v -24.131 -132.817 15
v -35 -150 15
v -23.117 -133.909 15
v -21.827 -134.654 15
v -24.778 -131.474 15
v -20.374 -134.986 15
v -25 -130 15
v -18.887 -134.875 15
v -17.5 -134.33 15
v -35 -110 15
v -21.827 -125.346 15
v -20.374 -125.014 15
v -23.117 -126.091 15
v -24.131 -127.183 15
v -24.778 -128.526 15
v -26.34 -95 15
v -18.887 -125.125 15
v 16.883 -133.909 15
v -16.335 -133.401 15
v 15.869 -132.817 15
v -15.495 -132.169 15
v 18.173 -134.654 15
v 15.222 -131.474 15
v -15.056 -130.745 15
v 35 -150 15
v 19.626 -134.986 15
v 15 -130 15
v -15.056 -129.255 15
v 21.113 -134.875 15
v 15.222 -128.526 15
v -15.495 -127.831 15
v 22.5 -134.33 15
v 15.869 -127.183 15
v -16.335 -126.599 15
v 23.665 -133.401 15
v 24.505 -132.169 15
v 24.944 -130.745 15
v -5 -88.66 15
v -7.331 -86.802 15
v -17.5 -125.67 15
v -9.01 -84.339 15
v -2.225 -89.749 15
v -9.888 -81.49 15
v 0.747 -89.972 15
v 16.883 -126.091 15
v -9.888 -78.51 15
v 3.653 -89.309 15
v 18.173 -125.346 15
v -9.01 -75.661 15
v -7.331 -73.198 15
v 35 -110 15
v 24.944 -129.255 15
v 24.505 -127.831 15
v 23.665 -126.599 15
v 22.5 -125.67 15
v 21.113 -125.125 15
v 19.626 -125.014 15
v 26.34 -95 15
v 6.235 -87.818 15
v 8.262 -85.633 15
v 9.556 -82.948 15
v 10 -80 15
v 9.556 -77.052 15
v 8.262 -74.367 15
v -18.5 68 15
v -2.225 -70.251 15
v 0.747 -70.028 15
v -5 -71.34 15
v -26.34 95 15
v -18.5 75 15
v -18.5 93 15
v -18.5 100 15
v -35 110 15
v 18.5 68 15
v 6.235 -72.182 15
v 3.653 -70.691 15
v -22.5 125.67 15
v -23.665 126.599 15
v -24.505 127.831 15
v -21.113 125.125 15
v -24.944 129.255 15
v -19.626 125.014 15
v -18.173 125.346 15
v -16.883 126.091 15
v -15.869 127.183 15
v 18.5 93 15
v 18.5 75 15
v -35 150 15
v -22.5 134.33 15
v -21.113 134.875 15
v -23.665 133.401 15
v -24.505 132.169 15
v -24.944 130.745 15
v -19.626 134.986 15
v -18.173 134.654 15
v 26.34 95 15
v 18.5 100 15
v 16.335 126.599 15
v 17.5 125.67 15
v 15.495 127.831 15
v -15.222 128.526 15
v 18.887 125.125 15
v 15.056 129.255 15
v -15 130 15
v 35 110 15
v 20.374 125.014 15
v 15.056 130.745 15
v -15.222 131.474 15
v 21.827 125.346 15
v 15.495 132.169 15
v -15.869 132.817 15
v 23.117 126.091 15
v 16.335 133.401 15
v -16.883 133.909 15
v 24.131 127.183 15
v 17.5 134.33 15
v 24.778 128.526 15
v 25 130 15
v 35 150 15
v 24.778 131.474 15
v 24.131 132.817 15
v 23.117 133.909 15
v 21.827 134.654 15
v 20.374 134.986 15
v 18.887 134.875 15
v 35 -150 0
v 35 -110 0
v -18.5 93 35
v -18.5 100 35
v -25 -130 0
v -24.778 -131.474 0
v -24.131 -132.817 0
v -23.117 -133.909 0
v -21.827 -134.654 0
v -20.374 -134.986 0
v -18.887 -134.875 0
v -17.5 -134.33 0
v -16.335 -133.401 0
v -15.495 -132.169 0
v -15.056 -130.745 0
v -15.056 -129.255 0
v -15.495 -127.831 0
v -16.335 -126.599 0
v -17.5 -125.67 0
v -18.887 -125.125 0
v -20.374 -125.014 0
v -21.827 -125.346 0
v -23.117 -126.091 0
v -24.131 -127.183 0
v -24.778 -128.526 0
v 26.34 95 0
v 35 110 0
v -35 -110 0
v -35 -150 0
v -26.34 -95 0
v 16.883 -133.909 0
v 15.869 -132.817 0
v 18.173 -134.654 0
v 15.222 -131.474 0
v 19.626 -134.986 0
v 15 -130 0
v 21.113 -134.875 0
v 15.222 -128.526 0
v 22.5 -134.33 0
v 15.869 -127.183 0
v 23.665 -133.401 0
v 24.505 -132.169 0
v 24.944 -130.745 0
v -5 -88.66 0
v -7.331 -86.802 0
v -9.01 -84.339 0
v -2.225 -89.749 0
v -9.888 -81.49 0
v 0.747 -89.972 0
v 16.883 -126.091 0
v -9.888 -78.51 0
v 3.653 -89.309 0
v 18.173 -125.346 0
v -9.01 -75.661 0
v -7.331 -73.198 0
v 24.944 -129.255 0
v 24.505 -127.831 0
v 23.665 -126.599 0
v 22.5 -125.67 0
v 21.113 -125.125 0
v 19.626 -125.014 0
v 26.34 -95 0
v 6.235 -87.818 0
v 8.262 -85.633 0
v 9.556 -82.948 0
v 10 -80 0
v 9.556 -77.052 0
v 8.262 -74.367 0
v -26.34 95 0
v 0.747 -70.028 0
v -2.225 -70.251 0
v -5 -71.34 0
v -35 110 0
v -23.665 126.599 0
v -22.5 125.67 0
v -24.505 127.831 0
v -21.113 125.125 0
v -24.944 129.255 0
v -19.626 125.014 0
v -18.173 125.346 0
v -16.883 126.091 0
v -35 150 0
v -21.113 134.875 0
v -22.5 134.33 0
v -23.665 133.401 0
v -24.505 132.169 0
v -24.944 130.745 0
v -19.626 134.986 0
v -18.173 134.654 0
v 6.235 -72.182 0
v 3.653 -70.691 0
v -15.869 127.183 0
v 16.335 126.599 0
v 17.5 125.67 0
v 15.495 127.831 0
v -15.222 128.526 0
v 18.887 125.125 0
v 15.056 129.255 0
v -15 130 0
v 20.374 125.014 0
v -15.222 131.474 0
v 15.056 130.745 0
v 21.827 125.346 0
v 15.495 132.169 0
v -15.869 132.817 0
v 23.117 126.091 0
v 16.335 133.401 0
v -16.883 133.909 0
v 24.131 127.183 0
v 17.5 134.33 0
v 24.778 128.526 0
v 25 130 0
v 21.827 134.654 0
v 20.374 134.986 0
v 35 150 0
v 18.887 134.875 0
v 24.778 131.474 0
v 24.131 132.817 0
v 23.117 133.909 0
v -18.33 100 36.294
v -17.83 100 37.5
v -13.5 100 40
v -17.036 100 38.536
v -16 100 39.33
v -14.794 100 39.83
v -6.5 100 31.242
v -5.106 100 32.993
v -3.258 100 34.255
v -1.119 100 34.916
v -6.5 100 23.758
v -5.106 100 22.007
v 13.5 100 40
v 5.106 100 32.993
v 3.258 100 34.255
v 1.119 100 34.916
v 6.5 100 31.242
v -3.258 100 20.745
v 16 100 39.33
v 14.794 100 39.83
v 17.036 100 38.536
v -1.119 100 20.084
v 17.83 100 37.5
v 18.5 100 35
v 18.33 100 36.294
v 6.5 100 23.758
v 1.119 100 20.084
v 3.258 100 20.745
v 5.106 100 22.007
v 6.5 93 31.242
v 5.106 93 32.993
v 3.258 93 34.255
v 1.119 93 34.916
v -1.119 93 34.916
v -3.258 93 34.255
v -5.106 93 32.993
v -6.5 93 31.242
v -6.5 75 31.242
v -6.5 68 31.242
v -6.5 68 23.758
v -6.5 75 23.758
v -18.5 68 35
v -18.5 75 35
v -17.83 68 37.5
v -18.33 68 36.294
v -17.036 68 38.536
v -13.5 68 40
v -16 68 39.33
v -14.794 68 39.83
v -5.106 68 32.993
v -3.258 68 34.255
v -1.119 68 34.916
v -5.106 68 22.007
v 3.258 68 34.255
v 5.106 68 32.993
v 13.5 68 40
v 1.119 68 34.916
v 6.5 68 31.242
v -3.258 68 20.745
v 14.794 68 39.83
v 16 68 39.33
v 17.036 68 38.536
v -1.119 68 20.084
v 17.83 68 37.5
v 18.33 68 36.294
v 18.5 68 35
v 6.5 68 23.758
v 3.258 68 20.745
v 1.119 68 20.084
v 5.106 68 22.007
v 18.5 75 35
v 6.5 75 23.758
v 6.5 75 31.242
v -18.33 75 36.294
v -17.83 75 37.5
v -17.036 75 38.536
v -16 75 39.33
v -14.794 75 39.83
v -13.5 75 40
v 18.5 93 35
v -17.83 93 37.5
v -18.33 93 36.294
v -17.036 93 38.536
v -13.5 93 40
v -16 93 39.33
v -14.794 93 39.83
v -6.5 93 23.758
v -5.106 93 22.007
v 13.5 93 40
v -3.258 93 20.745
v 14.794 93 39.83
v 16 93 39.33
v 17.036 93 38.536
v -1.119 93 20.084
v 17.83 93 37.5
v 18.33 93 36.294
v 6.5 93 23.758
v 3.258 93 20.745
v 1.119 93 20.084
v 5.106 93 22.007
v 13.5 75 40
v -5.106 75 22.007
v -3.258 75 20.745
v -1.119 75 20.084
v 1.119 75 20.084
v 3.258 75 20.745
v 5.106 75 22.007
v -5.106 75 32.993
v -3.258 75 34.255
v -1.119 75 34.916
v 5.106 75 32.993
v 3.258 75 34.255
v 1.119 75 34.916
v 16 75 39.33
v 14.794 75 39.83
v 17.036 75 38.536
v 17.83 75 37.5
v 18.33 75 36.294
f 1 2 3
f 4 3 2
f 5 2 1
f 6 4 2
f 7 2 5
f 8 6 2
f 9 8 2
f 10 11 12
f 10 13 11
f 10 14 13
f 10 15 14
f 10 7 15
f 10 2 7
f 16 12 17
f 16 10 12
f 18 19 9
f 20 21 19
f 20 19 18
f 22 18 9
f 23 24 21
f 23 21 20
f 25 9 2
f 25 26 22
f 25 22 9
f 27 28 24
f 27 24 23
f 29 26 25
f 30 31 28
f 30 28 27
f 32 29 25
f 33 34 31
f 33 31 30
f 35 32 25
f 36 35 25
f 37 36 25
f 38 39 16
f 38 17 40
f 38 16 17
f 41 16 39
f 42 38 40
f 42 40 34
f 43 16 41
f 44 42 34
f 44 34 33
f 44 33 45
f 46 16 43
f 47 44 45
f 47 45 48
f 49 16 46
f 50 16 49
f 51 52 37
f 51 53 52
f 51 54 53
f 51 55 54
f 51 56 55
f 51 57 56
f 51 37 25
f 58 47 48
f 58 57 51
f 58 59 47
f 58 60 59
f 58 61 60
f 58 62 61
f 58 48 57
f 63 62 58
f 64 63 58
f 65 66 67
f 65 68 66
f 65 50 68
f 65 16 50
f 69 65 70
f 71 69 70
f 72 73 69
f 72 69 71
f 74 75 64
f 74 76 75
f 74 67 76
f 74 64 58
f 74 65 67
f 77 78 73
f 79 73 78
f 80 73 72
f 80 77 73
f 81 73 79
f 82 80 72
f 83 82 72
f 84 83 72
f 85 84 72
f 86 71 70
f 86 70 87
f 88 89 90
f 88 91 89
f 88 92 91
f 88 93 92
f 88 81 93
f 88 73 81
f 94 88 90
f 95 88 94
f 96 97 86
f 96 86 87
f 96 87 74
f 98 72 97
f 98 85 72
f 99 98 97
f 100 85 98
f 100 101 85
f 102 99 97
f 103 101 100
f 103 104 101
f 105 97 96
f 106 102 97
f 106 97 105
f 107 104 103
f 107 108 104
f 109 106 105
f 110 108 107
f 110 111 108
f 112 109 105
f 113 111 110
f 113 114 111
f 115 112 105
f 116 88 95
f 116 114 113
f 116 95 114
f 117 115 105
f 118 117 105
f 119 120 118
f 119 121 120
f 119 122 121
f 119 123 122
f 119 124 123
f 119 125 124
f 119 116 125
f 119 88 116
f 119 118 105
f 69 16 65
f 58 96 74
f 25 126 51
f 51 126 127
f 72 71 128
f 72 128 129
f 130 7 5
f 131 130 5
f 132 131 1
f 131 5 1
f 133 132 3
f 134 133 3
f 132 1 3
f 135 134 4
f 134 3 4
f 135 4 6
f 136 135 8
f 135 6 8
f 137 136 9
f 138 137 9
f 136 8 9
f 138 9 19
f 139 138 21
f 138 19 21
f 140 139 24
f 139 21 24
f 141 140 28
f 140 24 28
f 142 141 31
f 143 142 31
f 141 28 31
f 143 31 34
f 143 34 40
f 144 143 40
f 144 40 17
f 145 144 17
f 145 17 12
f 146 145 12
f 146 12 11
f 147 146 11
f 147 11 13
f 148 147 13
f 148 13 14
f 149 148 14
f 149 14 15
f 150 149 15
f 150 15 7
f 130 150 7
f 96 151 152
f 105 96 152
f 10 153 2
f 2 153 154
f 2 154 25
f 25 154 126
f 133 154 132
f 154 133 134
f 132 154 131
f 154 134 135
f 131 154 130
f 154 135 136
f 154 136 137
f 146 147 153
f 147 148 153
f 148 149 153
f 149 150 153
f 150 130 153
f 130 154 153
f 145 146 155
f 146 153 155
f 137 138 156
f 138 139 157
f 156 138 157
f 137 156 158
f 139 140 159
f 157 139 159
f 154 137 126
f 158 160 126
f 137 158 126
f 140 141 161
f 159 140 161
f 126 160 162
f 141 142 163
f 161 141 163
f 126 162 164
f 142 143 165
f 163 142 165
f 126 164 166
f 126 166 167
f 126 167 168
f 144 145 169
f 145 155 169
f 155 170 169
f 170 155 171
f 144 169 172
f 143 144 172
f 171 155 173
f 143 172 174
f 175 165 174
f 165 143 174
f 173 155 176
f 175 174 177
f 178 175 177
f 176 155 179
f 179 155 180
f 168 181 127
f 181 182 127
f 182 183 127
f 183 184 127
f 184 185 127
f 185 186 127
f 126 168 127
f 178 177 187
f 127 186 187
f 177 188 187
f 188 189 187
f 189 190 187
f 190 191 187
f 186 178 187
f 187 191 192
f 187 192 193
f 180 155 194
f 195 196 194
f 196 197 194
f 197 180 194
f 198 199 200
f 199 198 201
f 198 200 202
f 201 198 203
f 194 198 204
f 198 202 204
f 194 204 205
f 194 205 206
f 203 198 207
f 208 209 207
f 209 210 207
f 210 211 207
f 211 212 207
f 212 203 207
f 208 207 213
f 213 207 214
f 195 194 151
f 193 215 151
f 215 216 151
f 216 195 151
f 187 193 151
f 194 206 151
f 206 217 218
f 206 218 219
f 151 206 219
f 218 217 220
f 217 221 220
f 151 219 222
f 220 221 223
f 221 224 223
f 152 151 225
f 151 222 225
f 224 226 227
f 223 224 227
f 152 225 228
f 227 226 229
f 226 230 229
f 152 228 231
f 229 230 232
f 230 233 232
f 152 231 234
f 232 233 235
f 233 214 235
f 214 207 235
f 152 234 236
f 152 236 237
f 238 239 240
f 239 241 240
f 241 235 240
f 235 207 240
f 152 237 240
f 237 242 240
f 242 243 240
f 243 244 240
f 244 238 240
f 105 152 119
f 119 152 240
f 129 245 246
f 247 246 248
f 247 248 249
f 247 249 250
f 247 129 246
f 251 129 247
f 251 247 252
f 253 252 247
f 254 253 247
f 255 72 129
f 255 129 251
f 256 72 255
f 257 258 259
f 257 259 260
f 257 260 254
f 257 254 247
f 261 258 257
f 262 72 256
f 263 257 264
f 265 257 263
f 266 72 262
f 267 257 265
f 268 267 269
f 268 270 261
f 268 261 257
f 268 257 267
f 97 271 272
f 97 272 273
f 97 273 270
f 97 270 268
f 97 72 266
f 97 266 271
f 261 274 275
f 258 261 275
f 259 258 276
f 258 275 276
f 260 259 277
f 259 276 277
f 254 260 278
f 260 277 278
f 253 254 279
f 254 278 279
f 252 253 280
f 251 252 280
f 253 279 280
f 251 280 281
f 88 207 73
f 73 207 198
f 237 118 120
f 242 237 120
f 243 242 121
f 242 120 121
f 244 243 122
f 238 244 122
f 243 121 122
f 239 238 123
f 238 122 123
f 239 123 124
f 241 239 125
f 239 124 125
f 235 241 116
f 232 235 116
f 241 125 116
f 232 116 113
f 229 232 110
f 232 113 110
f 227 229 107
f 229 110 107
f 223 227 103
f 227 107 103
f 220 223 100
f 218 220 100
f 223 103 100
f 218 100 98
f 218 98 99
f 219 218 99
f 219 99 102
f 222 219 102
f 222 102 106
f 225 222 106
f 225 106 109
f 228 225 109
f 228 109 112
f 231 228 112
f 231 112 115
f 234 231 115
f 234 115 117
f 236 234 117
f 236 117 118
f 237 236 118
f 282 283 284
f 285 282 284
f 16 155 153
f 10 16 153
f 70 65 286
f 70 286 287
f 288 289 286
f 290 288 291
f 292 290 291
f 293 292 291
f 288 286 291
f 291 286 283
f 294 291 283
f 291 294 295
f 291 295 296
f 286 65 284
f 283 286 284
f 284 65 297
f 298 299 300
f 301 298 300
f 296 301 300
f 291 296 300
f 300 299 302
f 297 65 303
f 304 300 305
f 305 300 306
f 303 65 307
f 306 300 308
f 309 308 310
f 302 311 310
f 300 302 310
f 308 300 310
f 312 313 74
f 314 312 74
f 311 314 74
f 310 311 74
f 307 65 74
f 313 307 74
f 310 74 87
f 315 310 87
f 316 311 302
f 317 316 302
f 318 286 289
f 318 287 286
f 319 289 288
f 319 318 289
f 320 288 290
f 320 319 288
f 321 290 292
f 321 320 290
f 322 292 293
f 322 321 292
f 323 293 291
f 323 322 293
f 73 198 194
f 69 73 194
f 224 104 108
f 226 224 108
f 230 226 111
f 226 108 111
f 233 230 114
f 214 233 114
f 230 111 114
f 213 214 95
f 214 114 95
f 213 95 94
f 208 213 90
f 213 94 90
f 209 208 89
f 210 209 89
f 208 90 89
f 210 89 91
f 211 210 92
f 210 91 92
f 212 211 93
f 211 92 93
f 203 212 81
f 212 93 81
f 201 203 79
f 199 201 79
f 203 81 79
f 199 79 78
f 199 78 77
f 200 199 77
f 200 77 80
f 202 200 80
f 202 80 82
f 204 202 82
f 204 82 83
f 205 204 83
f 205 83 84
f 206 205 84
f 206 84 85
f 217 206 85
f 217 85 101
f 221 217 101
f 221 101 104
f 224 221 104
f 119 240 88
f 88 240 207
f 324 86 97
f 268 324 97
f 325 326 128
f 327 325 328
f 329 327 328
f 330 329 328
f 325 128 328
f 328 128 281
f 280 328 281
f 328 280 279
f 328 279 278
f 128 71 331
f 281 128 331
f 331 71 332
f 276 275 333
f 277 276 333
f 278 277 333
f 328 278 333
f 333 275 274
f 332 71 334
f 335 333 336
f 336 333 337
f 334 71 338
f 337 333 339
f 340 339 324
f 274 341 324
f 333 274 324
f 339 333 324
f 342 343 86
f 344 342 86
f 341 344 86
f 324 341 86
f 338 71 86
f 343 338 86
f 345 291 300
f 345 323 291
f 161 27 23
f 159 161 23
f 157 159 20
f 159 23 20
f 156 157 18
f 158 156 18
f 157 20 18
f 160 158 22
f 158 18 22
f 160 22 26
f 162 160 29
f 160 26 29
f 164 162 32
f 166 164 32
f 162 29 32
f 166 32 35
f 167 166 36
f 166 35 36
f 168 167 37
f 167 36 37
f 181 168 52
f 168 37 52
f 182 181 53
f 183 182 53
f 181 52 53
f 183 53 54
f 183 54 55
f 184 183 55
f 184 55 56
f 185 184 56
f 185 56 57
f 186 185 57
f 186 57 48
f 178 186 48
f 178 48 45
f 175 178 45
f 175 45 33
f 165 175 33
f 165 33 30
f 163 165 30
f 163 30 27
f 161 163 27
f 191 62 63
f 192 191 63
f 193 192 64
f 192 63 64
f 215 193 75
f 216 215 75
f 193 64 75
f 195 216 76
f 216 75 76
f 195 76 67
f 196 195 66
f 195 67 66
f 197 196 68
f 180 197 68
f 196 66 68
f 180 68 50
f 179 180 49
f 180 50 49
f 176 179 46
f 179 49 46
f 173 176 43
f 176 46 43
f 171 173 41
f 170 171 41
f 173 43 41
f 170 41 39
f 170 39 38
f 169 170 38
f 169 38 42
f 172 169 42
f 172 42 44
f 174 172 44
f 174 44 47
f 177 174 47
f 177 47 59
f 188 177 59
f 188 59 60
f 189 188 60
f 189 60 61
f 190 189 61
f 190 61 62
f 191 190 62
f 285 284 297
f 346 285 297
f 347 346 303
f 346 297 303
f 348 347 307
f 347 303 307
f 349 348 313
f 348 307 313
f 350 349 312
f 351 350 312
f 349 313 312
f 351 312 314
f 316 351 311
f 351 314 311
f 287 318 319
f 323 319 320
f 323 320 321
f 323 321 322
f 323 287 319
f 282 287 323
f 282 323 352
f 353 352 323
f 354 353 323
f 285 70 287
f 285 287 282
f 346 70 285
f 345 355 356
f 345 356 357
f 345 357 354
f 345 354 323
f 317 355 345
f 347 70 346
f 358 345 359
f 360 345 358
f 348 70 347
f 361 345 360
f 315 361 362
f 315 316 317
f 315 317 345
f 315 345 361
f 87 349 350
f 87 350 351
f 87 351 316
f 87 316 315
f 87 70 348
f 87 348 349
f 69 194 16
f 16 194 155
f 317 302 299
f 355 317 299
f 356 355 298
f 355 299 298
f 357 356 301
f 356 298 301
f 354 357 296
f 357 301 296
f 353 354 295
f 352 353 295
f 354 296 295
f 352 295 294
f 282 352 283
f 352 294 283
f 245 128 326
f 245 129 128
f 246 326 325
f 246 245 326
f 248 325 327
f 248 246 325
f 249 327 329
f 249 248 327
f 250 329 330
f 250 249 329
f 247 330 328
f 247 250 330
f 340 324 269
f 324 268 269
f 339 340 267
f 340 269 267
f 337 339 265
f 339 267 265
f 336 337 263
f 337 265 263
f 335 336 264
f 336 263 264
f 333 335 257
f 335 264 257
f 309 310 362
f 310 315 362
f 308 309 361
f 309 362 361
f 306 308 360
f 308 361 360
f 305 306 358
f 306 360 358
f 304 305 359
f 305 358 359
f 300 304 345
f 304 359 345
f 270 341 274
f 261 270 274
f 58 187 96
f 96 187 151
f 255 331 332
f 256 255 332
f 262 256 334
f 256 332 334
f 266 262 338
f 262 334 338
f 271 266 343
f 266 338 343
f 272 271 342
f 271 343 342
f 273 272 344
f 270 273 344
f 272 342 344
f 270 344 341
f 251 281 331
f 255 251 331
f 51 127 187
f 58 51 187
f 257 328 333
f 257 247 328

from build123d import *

# Parameters (mm, degrees)
BOSS_EXTRUDE1_DEPTH = 15
SKETCH3_R           = 5
CUT_EXTRUDE1_DEPTH  = 155.757875405
SKETCH4_R           = 10
CUT_EXTRUDE2_DEPTH  = 155.757875405
SKETCH6_W           = 37
SKETCH6_H           = 7
BOSS_EXTRUDE2_DEPTH = 25
CUT_EXTRUDE3_DEPTH  = 32
FILLET3_R           = 5


with BuildPart() as part:
    # Sketch2 → Boss-Extrude1 (new body)
    with BuildSketch(Plane.XY):
        Polygon((-35, 110), (-26.339745962, 95), (-26.339745962, -95), (-35, -110), (-35, -150), (35, -150), (35, -110), (26.339745962, -95), (26.339745962, 95), (35, 110), (35, 150), (-35, 150), align=None)
    extrude(amount=BOSS_EXTRUDE1_DEPTH)

    # Sketch3 → Cut-Extrude1 (cut, through all)
    with BuildSketch(Plane.XY.offset(15)):
        with Locations((-20, 130)):
            Circle(SKETCH3_R)
        with Locations((20, 130)):
            Circle(SKETCH3_R)
        with Locations(Location((20, -130, 0), (0, 0, 180))):
            Circle(SKETCH3_R)
        with Locations(Location((-20, -130, 0), (0, 0, 180))):
            Circle(SKETCH3_R)
    extrude(amount=-CUT_EXTRUDE1_DEPTH, mode=Mode.SUBTRACT)

    # Sketch4 → Cut-Extrude2 (cut, through all)
    with BuildSketch(Plane.XY.offset(15)):
        with Locations((0, -80)):
            Circle(SKETCH4_R)
    extrude(amount=-CUT_EXTRUDE2_DEPTH, mode=Mode.SUBTRACT)

    # Sketch6 → Boss-Extrude2 (add)
    with BuildSketch(Plane.XY.offset(15)):
        with Locations((0, 96.5)):
            Rectangle(SKETCH6_W, SKETCH6_H)
        with Locations((0, 71.5)):
            Rectangle(SKETCH6_W, SKETCH6_H)
    extrude(amount=BOSS_EXTRUDE2_DEPTH)

    # Sketch7 → Cut-Extrude3 (cut)
    with BuildSketch(Plane.XZ.offset(-68)):
        with BuildLine():
            Line((-6.5, 31.241657387), (-6.5, 23.758342613))
            ThreePointArc((-6.5, 23.758342613), (0, 20), (6.5, 23.758342613))
            Line((6.5, 23.758342613), (6.5, 31.241657387))
            ThreePointArc((6.5, 31.241657387), (0, 35), (-6.5, 31.241657387))
        make_face()
    extrude(amount=-CUT_EXTRUDE3_DEPTH, mode=Mode.SUBTRACT)

    # Fillet3
    fillet3_edges = [part.edges().sort_by_distance(p)[0] for p in [
        (18.5, 96.5, 40),
        (-18.5, 96.5, 40),
        (18.5, 71.5, 40),
        (-18.5, 71.5, 40),
    ]]
    fillet(fillet3_edges, radius=FILLET3_R)


solid = part.part
